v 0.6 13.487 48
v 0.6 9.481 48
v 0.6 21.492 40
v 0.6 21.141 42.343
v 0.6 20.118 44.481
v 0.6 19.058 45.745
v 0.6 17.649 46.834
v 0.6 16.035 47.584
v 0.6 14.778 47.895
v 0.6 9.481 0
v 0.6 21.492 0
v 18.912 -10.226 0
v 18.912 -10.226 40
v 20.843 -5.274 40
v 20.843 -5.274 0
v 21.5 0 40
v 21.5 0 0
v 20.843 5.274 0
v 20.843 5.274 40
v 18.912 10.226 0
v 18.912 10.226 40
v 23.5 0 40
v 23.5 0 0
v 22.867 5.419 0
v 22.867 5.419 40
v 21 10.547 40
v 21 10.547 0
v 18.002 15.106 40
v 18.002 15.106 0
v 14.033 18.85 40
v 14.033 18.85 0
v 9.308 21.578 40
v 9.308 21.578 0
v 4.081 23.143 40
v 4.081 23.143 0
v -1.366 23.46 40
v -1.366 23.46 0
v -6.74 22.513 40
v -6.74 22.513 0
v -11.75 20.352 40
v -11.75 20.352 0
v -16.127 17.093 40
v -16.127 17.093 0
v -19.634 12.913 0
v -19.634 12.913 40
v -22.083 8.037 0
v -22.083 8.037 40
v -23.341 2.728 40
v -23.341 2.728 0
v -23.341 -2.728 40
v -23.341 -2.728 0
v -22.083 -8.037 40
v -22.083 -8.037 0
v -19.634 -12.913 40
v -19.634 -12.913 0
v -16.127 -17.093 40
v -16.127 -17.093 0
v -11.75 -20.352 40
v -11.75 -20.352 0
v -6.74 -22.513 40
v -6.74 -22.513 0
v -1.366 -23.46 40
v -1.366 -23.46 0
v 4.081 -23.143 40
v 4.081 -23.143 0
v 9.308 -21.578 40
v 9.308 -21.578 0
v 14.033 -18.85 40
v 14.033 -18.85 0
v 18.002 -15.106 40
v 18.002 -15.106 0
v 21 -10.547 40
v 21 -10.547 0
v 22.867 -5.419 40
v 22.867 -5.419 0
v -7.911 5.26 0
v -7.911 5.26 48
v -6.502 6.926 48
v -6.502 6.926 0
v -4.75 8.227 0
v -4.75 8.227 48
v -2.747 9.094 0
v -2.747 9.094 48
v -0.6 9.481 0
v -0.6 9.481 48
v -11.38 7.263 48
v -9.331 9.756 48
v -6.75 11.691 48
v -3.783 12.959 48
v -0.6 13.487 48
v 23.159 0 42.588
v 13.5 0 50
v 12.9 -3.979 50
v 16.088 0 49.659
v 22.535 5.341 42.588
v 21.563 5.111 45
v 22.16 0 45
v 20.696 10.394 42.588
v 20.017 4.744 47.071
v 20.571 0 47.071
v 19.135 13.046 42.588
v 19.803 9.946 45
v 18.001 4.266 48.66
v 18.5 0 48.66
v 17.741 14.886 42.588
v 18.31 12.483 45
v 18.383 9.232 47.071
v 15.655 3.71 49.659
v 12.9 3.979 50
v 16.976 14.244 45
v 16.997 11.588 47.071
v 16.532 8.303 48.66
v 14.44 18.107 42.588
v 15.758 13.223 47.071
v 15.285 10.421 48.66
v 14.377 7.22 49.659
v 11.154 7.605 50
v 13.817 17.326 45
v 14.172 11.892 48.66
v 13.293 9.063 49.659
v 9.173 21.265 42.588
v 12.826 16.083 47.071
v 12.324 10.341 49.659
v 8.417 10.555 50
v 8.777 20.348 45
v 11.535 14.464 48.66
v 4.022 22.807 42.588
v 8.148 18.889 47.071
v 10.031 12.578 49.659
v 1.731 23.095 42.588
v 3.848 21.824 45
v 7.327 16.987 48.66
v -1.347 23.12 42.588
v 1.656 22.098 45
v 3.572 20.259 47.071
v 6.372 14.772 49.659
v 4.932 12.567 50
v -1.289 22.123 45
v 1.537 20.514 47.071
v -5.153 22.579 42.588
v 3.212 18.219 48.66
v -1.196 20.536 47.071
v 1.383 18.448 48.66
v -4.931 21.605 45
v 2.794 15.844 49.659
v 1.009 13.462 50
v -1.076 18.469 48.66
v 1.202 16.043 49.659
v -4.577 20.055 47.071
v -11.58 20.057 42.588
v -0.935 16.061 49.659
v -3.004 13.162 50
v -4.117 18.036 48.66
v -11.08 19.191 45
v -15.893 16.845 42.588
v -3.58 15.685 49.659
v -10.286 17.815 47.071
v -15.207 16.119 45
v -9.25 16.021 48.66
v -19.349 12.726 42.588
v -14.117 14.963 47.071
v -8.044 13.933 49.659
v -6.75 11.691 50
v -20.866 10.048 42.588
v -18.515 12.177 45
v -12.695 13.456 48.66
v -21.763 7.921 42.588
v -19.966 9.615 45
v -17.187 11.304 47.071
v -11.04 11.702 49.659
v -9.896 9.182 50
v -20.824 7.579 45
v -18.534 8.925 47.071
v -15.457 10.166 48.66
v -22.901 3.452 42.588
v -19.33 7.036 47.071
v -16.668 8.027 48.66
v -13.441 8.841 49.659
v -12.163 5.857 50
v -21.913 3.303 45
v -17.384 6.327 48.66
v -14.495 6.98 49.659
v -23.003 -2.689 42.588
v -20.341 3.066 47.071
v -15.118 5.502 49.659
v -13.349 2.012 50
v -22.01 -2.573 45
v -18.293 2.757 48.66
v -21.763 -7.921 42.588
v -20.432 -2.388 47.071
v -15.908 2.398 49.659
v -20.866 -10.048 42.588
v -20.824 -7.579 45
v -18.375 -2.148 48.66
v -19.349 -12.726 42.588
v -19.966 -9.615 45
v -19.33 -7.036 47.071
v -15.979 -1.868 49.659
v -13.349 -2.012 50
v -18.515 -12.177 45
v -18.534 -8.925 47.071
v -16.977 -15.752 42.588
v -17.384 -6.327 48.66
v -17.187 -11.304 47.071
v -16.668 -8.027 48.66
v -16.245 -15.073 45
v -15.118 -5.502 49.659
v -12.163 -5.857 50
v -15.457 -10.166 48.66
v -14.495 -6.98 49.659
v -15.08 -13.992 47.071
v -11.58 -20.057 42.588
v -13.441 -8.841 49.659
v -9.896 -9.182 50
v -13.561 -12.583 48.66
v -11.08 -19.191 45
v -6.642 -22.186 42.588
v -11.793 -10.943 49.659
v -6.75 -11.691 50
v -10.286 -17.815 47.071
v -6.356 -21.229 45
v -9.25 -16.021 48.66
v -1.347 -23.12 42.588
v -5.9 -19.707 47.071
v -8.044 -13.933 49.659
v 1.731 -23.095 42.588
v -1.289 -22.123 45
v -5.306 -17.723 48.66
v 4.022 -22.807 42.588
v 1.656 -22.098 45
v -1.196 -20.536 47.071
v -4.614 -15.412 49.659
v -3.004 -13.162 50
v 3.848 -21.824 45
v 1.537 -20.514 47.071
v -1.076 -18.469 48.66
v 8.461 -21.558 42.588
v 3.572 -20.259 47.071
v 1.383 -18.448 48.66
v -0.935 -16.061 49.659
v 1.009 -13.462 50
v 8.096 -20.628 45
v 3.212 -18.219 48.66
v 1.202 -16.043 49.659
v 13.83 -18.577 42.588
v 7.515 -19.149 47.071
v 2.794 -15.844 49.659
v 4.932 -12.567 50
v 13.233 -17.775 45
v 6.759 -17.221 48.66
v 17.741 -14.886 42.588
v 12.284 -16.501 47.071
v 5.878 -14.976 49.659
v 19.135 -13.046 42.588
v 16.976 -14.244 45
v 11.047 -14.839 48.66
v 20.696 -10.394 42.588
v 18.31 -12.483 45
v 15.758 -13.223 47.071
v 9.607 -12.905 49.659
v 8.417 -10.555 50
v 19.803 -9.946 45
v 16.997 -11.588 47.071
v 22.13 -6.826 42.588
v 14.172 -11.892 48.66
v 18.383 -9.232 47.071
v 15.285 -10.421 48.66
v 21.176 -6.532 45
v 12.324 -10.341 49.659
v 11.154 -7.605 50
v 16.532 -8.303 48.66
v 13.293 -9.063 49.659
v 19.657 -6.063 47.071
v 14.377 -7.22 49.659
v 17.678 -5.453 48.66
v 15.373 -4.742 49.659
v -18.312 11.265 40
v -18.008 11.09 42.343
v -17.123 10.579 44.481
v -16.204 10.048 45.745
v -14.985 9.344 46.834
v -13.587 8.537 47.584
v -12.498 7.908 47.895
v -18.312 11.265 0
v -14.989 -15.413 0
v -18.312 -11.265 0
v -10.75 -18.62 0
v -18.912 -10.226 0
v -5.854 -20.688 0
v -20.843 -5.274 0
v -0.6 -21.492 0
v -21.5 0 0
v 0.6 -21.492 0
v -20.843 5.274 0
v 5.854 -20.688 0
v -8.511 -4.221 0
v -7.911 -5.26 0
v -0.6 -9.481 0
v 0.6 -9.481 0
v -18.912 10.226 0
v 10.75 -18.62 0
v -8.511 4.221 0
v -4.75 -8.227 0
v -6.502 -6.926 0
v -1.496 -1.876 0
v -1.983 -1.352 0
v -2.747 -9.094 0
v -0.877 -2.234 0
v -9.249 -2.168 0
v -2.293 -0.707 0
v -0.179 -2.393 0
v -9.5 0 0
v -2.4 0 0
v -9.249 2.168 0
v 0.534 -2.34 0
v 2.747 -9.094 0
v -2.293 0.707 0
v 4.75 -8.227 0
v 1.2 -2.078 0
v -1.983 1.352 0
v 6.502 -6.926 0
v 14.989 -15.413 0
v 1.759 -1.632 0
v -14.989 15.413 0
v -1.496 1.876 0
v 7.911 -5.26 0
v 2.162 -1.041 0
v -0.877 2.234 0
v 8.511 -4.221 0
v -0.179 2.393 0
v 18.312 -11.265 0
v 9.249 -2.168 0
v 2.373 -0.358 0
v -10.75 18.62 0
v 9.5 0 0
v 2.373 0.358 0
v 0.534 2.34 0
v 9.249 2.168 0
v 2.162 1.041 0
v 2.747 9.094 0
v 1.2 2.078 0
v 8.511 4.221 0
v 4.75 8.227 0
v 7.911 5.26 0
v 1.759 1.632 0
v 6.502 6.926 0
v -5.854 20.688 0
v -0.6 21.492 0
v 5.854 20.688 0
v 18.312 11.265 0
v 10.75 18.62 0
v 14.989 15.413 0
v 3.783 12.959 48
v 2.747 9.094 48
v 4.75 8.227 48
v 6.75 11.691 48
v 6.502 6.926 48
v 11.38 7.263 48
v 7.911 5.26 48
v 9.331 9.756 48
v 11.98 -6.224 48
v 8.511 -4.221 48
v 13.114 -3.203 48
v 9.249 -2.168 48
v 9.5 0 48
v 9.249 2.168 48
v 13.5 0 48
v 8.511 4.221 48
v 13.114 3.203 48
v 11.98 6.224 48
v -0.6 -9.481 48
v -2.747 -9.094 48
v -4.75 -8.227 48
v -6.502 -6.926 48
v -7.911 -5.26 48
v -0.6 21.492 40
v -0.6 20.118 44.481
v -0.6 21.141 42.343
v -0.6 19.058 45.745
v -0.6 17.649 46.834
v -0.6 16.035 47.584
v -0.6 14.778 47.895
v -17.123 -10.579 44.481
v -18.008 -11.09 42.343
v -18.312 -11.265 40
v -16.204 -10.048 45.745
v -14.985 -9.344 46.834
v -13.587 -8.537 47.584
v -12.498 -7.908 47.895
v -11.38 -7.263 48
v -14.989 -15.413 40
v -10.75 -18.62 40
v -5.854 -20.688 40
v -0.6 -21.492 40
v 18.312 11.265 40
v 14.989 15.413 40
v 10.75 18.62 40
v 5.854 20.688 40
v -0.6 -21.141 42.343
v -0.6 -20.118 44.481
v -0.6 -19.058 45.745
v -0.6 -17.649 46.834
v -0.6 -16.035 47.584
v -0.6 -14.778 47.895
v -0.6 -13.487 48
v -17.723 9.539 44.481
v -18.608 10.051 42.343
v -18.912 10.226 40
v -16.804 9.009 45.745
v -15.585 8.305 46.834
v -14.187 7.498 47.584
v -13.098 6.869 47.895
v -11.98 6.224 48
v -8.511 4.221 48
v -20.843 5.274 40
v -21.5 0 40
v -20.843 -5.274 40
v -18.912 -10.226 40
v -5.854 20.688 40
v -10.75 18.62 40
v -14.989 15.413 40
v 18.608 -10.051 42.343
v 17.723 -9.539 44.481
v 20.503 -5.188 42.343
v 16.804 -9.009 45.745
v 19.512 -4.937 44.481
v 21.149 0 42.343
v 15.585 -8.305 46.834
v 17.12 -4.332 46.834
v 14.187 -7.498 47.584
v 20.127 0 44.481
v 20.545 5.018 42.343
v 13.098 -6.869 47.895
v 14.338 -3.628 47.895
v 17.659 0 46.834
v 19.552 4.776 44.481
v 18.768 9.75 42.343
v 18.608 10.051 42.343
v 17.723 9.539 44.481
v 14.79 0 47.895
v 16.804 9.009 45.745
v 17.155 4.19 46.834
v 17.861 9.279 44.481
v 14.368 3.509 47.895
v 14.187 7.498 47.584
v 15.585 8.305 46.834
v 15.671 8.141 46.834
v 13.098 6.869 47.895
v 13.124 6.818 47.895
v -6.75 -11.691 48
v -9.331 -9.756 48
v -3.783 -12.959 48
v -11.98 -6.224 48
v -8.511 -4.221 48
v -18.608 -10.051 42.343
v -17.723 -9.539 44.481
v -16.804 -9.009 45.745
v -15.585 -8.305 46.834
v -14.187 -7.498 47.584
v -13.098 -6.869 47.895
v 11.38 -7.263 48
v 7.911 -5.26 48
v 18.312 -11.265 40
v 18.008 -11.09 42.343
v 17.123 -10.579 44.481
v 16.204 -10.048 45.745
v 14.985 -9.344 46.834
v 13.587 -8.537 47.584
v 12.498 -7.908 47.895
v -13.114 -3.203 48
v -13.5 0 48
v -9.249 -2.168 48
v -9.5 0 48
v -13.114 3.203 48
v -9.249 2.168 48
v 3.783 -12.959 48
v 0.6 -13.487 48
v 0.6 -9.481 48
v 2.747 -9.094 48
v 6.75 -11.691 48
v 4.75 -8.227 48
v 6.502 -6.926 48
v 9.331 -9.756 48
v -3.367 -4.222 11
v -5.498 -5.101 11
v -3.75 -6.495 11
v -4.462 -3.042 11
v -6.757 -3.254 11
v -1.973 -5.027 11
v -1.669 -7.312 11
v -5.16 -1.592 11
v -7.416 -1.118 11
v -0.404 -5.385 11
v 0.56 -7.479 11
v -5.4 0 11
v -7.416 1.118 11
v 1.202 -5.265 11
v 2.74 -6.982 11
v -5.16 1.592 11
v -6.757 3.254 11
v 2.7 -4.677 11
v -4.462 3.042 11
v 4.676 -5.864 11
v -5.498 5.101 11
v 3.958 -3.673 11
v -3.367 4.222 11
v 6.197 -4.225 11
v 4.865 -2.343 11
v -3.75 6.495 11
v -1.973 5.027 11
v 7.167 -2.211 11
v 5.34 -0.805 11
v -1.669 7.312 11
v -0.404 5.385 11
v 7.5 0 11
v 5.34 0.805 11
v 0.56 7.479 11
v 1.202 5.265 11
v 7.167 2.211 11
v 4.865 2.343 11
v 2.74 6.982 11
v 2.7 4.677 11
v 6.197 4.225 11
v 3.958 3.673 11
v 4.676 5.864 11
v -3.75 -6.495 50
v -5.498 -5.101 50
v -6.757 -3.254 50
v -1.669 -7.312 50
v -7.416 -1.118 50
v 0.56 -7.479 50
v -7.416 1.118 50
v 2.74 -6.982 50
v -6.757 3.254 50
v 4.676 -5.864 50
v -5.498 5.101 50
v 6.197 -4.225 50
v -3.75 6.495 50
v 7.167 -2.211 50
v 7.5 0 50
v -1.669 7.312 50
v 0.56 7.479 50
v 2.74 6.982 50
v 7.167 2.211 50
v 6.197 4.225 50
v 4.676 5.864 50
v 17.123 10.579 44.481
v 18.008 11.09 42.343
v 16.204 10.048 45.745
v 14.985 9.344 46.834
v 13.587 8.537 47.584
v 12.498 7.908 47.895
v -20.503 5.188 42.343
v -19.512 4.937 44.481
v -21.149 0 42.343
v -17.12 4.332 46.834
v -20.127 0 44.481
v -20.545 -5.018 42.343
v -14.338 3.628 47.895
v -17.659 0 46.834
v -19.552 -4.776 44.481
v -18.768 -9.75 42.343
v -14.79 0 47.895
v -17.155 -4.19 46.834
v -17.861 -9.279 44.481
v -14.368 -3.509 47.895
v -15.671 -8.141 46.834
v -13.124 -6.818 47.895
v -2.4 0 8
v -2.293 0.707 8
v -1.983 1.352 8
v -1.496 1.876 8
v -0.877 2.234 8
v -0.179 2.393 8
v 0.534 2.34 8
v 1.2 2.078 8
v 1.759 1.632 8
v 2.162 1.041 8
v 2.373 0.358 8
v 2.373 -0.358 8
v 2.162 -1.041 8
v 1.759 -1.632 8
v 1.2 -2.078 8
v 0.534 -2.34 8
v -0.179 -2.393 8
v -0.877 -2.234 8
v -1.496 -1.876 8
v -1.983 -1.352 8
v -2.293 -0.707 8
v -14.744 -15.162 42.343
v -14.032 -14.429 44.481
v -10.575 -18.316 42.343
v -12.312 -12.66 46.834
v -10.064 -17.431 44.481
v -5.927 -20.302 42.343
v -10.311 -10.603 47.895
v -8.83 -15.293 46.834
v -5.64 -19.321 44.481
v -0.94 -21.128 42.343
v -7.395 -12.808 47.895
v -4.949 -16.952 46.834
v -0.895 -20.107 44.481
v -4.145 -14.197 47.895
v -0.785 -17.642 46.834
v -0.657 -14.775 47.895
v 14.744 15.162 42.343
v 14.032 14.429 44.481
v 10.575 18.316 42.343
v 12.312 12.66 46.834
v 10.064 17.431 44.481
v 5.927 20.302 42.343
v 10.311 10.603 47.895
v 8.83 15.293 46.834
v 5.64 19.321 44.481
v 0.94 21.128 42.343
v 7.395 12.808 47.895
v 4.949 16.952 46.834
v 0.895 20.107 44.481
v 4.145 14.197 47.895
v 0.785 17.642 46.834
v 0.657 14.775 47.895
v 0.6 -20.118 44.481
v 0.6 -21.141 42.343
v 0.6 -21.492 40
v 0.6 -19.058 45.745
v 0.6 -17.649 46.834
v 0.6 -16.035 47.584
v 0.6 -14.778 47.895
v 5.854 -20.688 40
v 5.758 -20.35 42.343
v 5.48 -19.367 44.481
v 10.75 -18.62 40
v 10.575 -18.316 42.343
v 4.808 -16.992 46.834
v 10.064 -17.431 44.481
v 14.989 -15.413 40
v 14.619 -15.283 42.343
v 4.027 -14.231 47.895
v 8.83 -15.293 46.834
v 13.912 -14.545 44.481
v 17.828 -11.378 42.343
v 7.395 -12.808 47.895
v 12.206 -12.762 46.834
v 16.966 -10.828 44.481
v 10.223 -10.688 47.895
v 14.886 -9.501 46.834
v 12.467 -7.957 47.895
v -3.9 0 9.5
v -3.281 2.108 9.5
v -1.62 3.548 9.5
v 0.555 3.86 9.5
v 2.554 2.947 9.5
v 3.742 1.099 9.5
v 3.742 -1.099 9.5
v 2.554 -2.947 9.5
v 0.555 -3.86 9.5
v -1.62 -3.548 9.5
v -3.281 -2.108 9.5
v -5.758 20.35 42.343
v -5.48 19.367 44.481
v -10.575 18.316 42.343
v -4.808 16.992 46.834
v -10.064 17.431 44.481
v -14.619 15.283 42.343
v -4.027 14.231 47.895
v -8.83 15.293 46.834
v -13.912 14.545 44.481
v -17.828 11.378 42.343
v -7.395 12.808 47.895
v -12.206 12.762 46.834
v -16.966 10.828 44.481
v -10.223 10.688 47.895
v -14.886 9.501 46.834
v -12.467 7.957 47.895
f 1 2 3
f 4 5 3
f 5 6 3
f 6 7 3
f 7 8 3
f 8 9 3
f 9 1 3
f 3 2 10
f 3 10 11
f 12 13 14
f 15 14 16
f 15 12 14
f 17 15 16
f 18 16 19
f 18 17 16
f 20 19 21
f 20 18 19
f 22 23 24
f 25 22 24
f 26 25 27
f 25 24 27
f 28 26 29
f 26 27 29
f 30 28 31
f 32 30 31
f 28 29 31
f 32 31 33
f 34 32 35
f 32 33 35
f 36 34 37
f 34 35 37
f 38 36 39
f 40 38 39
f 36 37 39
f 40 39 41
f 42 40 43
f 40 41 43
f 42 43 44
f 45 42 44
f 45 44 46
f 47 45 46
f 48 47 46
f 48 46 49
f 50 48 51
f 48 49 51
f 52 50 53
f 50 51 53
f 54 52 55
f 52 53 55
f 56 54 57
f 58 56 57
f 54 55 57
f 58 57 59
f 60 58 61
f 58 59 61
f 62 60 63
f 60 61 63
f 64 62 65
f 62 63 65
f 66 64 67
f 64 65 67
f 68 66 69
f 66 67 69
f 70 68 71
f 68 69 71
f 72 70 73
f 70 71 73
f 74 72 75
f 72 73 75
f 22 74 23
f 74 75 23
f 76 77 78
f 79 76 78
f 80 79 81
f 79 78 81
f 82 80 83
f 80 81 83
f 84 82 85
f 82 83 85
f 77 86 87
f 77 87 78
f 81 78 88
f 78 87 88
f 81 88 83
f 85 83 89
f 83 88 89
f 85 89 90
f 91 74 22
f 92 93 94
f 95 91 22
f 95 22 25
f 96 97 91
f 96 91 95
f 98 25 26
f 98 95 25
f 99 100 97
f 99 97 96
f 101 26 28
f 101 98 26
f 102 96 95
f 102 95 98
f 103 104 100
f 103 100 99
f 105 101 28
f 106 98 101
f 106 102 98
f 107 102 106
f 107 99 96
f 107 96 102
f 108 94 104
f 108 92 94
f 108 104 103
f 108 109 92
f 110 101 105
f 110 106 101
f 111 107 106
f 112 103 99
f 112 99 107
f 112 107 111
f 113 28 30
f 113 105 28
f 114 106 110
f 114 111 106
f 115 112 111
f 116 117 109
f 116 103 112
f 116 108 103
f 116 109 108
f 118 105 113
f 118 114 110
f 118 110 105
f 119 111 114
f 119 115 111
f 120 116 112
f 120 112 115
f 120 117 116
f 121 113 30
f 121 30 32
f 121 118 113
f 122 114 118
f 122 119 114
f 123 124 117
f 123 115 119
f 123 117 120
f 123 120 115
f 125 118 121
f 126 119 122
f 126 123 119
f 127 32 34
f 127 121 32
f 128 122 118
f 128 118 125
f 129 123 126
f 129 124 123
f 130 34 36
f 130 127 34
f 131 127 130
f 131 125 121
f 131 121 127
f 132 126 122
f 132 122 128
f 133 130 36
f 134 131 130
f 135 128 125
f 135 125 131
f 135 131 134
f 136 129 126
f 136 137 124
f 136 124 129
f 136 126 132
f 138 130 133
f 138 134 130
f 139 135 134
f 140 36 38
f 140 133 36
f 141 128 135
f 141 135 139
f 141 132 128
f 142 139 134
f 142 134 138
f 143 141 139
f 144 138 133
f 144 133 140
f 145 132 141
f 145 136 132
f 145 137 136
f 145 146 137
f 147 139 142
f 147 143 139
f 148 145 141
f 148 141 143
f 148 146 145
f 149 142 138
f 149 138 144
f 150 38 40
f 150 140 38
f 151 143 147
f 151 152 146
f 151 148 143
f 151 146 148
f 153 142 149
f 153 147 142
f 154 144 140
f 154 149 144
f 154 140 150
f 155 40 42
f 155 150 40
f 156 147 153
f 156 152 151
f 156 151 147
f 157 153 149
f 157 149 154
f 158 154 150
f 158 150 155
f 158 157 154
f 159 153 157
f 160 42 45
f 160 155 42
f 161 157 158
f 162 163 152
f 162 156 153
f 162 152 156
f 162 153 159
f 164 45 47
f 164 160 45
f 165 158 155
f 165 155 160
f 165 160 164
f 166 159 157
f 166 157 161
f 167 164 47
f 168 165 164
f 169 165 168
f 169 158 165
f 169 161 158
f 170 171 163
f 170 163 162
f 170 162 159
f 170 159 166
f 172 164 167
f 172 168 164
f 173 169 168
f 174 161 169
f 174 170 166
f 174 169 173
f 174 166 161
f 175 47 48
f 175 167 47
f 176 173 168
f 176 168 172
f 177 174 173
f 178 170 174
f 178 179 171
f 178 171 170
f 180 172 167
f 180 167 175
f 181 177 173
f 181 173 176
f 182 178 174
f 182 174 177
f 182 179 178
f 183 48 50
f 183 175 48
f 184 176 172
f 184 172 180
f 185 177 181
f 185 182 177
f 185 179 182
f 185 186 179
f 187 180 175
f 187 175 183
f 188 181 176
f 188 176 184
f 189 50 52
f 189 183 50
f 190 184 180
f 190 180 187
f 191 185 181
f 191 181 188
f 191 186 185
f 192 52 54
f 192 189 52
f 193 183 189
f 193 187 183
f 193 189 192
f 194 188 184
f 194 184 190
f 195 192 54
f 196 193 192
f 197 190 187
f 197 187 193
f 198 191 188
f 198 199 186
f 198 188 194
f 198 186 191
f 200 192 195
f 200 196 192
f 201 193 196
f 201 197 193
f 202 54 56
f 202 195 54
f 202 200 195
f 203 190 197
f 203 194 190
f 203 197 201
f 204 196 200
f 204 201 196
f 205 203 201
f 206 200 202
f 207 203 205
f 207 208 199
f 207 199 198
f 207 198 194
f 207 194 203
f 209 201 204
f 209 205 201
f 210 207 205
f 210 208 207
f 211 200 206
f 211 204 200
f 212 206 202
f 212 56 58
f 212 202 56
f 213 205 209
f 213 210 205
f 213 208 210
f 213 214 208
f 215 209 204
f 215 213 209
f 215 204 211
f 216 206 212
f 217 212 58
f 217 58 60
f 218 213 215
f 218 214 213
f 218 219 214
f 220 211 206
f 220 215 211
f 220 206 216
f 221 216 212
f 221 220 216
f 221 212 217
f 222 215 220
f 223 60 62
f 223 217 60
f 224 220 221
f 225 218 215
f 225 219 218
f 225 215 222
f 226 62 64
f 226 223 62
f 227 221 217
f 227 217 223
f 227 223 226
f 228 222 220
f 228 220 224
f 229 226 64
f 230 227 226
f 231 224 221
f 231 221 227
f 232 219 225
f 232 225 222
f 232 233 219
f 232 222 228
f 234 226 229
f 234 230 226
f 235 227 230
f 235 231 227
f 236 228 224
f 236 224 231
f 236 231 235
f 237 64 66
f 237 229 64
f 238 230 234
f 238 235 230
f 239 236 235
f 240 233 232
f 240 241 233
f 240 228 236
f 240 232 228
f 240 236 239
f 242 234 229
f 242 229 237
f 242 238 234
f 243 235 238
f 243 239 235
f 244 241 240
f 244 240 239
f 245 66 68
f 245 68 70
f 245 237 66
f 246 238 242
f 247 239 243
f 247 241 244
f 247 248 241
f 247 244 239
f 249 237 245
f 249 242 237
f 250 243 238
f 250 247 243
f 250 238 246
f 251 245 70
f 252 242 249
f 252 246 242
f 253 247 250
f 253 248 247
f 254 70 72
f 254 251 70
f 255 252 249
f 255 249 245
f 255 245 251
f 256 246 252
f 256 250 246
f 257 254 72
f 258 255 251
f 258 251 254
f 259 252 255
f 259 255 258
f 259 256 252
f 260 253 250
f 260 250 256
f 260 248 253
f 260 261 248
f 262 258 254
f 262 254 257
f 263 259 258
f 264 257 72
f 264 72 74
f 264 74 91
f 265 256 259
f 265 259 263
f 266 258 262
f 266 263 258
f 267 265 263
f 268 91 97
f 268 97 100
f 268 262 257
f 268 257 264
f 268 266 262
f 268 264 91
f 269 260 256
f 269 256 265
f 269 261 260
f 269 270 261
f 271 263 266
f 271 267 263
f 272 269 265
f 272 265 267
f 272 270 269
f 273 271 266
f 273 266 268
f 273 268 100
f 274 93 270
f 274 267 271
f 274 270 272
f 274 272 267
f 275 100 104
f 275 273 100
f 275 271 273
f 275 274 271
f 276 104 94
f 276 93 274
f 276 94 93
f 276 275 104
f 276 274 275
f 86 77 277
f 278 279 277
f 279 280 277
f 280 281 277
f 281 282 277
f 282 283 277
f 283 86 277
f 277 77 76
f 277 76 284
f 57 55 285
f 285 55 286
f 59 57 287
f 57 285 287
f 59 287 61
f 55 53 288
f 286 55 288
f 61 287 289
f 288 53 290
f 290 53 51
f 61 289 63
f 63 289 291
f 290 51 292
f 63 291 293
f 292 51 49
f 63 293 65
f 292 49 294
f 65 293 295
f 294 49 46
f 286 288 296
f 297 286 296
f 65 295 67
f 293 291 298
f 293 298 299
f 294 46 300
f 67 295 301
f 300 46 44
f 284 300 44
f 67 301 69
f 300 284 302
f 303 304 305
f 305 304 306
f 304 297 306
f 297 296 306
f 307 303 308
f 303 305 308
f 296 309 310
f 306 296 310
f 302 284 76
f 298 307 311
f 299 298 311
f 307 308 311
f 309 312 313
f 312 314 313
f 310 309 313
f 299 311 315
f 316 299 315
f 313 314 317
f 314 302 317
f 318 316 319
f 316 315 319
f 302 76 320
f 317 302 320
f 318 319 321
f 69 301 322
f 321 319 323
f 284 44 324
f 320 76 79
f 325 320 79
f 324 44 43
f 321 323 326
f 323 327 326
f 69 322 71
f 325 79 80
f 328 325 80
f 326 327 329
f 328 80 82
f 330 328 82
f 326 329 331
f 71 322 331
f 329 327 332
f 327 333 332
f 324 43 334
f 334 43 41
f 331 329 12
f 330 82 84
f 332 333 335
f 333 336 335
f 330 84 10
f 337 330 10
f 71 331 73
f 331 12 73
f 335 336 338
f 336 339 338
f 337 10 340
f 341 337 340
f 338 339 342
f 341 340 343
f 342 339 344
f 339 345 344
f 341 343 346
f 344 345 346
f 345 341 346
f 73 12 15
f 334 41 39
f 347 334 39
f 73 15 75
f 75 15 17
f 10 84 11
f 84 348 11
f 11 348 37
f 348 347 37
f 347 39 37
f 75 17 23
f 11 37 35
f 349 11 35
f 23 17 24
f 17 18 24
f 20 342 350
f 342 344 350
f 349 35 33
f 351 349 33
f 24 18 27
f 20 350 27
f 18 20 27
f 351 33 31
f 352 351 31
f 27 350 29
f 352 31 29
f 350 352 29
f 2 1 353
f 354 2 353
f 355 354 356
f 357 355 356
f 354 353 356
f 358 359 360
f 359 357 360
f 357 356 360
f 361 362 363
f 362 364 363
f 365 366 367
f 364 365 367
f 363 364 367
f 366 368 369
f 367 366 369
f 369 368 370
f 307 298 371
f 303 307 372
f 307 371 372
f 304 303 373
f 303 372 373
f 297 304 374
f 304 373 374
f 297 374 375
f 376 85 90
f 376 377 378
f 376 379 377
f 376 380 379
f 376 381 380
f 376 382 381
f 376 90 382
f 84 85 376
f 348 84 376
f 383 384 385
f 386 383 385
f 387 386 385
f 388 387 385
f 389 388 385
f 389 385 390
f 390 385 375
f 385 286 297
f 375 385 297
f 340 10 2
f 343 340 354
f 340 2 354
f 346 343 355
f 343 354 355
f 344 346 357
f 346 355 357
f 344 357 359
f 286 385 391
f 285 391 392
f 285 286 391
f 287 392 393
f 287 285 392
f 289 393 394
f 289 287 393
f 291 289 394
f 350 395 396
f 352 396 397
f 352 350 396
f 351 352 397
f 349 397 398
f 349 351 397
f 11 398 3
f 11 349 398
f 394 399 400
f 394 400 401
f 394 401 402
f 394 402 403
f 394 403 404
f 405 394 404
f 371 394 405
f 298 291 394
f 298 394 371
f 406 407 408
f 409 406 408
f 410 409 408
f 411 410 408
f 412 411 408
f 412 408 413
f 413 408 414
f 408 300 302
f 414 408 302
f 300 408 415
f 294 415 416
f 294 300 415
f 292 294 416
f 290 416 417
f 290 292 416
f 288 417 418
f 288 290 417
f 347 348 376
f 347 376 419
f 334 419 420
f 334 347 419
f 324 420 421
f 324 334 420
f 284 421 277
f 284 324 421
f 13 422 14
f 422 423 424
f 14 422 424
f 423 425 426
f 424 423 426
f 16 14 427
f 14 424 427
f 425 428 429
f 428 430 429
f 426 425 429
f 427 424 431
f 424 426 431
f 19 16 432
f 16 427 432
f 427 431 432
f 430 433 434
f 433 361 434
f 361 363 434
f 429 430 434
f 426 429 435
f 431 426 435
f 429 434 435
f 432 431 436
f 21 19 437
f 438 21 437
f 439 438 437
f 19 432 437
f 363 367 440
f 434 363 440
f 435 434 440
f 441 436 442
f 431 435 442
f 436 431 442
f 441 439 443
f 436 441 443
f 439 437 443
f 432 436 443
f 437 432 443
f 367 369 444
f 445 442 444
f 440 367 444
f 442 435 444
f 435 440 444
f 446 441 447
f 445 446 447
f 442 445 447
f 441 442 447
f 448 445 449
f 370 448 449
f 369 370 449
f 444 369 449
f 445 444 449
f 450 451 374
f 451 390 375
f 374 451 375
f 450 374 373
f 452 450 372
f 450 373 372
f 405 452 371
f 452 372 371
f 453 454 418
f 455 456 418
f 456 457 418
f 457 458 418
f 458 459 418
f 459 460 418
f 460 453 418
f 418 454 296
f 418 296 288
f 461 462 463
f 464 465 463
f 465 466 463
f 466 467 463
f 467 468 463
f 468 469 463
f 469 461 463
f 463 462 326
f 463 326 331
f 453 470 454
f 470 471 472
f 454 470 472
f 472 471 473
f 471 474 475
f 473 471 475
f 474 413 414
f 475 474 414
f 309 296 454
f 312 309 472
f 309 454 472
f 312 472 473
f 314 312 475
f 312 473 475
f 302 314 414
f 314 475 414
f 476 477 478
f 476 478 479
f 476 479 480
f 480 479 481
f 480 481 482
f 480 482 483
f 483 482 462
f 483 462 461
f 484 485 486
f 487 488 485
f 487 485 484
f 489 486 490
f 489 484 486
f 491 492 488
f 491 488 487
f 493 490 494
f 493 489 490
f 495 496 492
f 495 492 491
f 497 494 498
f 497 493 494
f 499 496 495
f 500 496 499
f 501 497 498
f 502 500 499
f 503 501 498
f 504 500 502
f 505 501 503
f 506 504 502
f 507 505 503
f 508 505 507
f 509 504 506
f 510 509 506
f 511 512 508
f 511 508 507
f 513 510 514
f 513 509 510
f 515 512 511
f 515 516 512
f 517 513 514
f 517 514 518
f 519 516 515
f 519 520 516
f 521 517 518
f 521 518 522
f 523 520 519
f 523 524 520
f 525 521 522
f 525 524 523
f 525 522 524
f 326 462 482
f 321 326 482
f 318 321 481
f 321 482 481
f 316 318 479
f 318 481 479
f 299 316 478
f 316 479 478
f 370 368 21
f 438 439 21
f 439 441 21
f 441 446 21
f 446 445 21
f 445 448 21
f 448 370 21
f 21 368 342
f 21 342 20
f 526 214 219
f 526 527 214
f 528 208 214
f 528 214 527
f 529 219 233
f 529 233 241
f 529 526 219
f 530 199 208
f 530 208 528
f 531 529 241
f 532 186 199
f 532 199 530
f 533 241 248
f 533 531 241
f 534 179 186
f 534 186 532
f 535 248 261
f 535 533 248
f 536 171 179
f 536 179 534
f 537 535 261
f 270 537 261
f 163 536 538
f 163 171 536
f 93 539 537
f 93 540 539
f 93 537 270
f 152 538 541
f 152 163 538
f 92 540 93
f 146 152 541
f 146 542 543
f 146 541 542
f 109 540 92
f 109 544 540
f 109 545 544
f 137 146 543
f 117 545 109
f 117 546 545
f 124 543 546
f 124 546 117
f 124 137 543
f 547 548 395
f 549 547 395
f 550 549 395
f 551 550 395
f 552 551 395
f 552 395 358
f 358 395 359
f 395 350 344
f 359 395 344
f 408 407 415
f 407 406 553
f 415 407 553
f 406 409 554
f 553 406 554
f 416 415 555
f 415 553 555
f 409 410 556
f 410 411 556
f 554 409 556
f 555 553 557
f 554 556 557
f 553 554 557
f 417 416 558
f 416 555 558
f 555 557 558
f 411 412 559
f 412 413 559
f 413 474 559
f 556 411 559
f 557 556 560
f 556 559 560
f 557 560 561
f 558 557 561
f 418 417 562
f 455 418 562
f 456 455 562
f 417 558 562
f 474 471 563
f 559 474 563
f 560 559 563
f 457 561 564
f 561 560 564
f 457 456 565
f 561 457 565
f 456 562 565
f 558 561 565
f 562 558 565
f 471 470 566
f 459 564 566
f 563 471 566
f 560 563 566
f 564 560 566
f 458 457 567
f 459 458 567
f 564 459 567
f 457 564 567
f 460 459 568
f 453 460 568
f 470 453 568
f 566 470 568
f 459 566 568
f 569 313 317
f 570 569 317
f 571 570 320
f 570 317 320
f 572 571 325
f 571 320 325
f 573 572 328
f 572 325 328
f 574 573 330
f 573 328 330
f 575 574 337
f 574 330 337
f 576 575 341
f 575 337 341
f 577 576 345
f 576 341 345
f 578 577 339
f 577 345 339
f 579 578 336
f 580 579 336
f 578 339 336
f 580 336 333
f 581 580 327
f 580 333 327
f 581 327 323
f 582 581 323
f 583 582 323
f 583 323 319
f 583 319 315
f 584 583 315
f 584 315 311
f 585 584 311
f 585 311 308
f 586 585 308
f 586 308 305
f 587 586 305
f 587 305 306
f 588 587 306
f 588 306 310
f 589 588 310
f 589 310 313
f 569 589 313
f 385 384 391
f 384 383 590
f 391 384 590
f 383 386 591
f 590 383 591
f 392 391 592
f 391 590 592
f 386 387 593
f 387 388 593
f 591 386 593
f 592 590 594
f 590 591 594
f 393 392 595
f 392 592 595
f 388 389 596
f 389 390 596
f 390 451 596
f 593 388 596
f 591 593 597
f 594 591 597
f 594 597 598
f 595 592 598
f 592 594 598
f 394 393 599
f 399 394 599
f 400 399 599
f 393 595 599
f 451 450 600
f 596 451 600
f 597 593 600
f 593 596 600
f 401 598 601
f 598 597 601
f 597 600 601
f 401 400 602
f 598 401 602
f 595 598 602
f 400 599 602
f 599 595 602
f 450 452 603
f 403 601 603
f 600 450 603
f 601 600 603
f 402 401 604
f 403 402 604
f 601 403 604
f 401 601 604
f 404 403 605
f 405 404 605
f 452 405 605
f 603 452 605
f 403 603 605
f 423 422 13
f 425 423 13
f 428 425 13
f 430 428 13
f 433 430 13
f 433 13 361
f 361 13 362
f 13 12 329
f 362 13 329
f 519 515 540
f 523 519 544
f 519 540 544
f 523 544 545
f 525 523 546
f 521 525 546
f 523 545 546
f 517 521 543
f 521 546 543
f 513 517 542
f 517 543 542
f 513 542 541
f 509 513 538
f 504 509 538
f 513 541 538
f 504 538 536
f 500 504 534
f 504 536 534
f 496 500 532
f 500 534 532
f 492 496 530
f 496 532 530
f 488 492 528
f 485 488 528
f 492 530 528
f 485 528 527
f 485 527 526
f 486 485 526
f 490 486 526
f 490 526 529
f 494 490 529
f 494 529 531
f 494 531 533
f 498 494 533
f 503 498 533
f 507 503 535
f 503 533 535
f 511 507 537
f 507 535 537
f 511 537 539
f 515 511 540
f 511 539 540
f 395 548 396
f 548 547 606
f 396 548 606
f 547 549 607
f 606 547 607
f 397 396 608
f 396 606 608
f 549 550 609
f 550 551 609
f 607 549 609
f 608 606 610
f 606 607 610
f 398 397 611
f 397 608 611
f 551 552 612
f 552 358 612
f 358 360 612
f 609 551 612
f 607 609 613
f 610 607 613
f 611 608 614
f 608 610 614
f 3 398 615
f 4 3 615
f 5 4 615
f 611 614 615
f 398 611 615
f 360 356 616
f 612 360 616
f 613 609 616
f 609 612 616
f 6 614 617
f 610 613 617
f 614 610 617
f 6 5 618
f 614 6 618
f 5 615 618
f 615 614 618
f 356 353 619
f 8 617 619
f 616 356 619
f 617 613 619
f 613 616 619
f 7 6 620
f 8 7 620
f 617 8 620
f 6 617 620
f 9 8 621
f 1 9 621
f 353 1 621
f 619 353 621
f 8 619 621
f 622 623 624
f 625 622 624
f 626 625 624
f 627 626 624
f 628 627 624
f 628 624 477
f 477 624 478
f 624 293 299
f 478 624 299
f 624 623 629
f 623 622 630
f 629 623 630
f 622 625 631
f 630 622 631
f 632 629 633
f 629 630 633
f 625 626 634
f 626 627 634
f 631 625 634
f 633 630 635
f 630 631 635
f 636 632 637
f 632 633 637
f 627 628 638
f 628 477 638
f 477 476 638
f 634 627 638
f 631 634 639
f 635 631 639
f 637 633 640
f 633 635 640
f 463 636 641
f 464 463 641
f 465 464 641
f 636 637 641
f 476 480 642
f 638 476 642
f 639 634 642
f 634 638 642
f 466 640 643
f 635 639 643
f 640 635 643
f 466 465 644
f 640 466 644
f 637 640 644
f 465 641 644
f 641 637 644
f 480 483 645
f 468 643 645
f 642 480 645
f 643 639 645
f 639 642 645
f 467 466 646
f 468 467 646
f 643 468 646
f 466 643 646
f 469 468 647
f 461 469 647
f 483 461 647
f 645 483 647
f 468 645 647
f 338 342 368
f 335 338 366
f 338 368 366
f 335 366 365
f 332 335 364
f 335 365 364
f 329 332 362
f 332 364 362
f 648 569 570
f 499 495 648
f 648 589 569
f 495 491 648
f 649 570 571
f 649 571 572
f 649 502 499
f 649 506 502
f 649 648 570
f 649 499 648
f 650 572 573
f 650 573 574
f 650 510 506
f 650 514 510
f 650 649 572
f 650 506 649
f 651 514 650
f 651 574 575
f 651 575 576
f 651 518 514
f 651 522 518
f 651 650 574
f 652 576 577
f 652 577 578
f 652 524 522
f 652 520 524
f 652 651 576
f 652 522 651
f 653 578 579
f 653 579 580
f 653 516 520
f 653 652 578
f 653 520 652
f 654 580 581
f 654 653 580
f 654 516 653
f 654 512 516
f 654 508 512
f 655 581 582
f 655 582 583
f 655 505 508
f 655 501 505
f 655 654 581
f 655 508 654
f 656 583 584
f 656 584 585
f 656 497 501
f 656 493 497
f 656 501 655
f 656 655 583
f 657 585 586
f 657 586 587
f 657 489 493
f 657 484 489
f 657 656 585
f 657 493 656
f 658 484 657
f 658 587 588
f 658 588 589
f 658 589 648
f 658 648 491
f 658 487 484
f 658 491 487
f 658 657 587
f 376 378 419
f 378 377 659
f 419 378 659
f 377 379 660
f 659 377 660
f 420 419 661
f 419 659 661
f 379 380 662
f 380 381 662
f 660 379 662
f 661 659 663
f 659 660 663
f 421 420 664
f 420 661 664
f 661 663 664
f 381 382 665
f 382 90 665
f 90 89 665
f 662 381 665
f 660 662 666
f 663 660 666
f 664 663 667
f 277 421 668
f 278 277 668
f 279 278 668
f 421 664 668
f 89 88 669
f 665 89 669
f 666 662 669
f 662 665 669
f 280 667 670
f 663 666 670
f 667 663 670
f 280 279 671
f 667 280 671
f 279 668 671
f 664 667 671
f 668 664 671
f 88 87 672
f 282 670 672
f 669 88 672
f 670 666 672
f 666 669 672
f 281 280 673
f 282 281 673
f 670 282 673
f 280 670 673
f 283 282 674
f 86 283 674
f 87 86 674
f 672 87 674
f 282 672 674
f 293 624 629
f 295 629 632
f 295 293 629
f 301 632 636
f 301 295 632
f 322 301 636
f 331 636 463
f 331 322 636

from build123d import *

# Parameters (mm, degrees)
SKETCH_2_R          = 23.5
EXTRUDE_1_DEPTH     = 50
FILLET_3_R          = 10
SHELL_2_T           = -2
SKETCH_5_R          = 9.5
EXTRUDE_2_DEPTH     = 48
SKETCH_6_R          = 2.4
CUT_EXTRUDE_1_DEPTH = 61.037488289
EXTRUDE_3_REACH     = 62.037
SKETCH_7_W          = 1.2
SKETCH_7_H          = 13
SKETCH_8_R          = 7.5
CUT_EXTRUDE_2_DEPTH = 39
CHAMFER_1_SIZE      = 3


with BuildPart() as part:
    # Эскиз2 → Бобышка-Вытянуть1 (new body)
    with BuildSketch(Plane.XY):
        Circle(SKETCH_2_R)
    extrude(amount=EXTRUDE_1_DEPTH)

    # Скругление3
    fillet_3_edges = [part.edges().sort_by_distance(p)[0] for p in [
        (-23.5, 0, 50),
    ]]
    fillet(fillet_3_edges, radius=FILLET_3_R)

    # Оболочка2
    shell_2_openings = [part.faces().sort_by_distance(p)[0] for p in [
        (0, 0, 0),
    ]]
    offset(amount=SHELL_2_T, openings=shell_2_openings, kind=Kind.INTERSECTION)

    # Эскиз5 → Бобышка-Вытянуть2 (add)
    with BuildSketch(Plane(origin=(0, 0, 48), x_dir=(-1, 0, 0), z_dir=(0, 0, -1))):
        with Locations(Location((0, 0, 0), (0, 0, 180))):
            Circle(SKETCH_5_R)
    extrude(amount=EXTRUDE_2_DEPTH)

    # Эскиз6 → Вырез-Вытянуть1 (cut, through all)
    with BuildSketch(Plane(origin=(0, 0, 0), x_dir=(-1, 0, 0), z_dir=(0, 0, -1))):
        Circle(SKETCH_6_R)
    extrude(amount=-CUT_EXTRUDE_1_DEPTH, mode=Mode.SUBTRACT)

    # Эскиз7 → Бобышка-Вытянуть3 (add, up to next)
    with BuildSketch(Plane(origin=(0, 0, 0), x_dir=(-1, 0, 0), z_dir=(0, 0, -1)), mode=Mode.PRIVATE) as extrude_3_sk1:
        with Locations((0, 15.437627965)):
            Rectangle(SKETCH_7_W, SKETCH_7_H)
    extrude_3_tool1 = extrude(extrude_3_sk1.sketch, amount=-EXTRUDE_3_REACH, mode=Mode.PRIVATE) - part.part
    # Эскиз7 → Бобышка-Вытянуть3 (add, up to next)
    with BuildSketch(Plane(origin=(0, 0, 0), x_dir=(-1, 0, 0), z_dir=(0, 0, -1)), mode=Mode.PRIVATE) as extrude_3_sk2:
        Polygon((7.440212867, 4.988429225), (18.698543116, 11.488429225), (19.298543116, 10.44919874), (8.040212867, 3.94919874), align=None)
    extrude_3_tool2 = extrude(extrude_3_sk2.sketch, amount=-EXTRUDE_3_REACH, mode=Mode.PRIVATE) - part.part
    # Эскиз7 → Бобышка-Вытянуть3 (add, up to next)
    with BuildSketch(Plane(origin=(0, 0, 0), x_dir=(-1, 0, 0), z_dir=(0, 0, -1)), mode=Mode.PRIVATE) as extrude_3_sk3:
        Polygon((8.040212867, -3.94919874), (19.298543117, -10.44919874), (18.698543117, -11.488429225), (7.440212867, -4.988429225), align=None)
    extrude_3_tool3 = extrude(extrude_3_sk3.sketch, amount=-EXTRUDE_3_REACH, mode=Mode.PRIVATE) - part.part
    # Эскиз7 → Бобышка-Вытянуть3 (add, up to next)
    with BuildSketch(Plane(origin=(0, 0, 0), x_dir=(-1, 0, 0), z_dir=(0, 0, -1)), mode=Mode.PRIVATE) as extrude_3_sk4:
        with Locations((0, -15.437627965)):
            Rectangle(SKETCH_7_W, SKETCH_7_H)
    extrude_3_tool4 = extrude(extrude_3_sk4.sketch, amount=-EXTRUDE_3_REACH, mode=Mode.PRIVATE) - part.part
    # Эскиз7 → Бобышка-Вытянуть3 (add, up to next)
    with BuildSketch(Plane(origin=(0, 0, 0), x_dir=(-1, 0, 0), z_dir=(0, 0, -1)), mode=Mode.PRIVATE) as extrude_3_sk5:
        Polygon((-7.440212867, -4.988429225), (-18.698543116, -11.488429225), (-19.298543116, -10.44919874), (-8.040212867, -3.94919874), align=None)
    extrude_3_tool5 = extrude(extrude_3_sk5.sketch, amount=-EXTRUDE_3_REACH, mode=Mode.PRIVATE) - part.part
    # Эскиз7 → Бобышка-Вытянуть3 (add, up to next)
    with BuildSketch(Plane(origin=(0, 0, 0), x_dir=(-1, 0, 0), z_dir=(0, 0, -1)), mode=Mode.PRIVATE) as extrude_3_sk6:
        Polygon((-8.040212867, 3.94919874), (-19.298543116, 10.44919874), (-18.698543116, 11.488429225), (-7.440212867, 4.988429225), align=None)
    extrude_3_tool6 = extrude(extrude_3_sk6.sketch, amount=-EXTRUDE_3_REACH, mode=Mode.PRIVATE) - part.part
    add(extrude_3_tool1.solids().sort_by_distance((0, 15.437628, 0))[0])
    add(extrude_3_tool2.solids().sort_by_distance((-13.369378, 7.718814, 0))[0])
    add(extrude_3_tool3.solids().sort_by_distance((-13.369378, -7.718814, 0))[0])
    add(extrude_3_tool4.solids().sort_by_distance((0, -15.437628, 0))[0])
    add(extrude_3_tool5.solids().sort_by_distance((13.369378, -7.718814, 0))[0])
    add(extrude_3_tool6.solids().sort_by_distance((13.369378, 7.718814, 0))[0])

    # Эскиз8 → Вырез-Вытянуть2 (cut)
    with BuildSketch(Plane.XY.offset(50)):
        Circle(SKETCH_8_R)
    extrude(amount=-CUT_EXTRUDE_2_DEPTH, mode=Mode.SUBTRACT)

    # Фаска1
    chamfer_1_edges = [part.edges().sort_by_distance(p)[0] for p in [
        (2.4, 0, 11),
    ]]
    chamfer(chamfer_1_edges, length=CHAMFER_1_SIZE)


solid = part.part
